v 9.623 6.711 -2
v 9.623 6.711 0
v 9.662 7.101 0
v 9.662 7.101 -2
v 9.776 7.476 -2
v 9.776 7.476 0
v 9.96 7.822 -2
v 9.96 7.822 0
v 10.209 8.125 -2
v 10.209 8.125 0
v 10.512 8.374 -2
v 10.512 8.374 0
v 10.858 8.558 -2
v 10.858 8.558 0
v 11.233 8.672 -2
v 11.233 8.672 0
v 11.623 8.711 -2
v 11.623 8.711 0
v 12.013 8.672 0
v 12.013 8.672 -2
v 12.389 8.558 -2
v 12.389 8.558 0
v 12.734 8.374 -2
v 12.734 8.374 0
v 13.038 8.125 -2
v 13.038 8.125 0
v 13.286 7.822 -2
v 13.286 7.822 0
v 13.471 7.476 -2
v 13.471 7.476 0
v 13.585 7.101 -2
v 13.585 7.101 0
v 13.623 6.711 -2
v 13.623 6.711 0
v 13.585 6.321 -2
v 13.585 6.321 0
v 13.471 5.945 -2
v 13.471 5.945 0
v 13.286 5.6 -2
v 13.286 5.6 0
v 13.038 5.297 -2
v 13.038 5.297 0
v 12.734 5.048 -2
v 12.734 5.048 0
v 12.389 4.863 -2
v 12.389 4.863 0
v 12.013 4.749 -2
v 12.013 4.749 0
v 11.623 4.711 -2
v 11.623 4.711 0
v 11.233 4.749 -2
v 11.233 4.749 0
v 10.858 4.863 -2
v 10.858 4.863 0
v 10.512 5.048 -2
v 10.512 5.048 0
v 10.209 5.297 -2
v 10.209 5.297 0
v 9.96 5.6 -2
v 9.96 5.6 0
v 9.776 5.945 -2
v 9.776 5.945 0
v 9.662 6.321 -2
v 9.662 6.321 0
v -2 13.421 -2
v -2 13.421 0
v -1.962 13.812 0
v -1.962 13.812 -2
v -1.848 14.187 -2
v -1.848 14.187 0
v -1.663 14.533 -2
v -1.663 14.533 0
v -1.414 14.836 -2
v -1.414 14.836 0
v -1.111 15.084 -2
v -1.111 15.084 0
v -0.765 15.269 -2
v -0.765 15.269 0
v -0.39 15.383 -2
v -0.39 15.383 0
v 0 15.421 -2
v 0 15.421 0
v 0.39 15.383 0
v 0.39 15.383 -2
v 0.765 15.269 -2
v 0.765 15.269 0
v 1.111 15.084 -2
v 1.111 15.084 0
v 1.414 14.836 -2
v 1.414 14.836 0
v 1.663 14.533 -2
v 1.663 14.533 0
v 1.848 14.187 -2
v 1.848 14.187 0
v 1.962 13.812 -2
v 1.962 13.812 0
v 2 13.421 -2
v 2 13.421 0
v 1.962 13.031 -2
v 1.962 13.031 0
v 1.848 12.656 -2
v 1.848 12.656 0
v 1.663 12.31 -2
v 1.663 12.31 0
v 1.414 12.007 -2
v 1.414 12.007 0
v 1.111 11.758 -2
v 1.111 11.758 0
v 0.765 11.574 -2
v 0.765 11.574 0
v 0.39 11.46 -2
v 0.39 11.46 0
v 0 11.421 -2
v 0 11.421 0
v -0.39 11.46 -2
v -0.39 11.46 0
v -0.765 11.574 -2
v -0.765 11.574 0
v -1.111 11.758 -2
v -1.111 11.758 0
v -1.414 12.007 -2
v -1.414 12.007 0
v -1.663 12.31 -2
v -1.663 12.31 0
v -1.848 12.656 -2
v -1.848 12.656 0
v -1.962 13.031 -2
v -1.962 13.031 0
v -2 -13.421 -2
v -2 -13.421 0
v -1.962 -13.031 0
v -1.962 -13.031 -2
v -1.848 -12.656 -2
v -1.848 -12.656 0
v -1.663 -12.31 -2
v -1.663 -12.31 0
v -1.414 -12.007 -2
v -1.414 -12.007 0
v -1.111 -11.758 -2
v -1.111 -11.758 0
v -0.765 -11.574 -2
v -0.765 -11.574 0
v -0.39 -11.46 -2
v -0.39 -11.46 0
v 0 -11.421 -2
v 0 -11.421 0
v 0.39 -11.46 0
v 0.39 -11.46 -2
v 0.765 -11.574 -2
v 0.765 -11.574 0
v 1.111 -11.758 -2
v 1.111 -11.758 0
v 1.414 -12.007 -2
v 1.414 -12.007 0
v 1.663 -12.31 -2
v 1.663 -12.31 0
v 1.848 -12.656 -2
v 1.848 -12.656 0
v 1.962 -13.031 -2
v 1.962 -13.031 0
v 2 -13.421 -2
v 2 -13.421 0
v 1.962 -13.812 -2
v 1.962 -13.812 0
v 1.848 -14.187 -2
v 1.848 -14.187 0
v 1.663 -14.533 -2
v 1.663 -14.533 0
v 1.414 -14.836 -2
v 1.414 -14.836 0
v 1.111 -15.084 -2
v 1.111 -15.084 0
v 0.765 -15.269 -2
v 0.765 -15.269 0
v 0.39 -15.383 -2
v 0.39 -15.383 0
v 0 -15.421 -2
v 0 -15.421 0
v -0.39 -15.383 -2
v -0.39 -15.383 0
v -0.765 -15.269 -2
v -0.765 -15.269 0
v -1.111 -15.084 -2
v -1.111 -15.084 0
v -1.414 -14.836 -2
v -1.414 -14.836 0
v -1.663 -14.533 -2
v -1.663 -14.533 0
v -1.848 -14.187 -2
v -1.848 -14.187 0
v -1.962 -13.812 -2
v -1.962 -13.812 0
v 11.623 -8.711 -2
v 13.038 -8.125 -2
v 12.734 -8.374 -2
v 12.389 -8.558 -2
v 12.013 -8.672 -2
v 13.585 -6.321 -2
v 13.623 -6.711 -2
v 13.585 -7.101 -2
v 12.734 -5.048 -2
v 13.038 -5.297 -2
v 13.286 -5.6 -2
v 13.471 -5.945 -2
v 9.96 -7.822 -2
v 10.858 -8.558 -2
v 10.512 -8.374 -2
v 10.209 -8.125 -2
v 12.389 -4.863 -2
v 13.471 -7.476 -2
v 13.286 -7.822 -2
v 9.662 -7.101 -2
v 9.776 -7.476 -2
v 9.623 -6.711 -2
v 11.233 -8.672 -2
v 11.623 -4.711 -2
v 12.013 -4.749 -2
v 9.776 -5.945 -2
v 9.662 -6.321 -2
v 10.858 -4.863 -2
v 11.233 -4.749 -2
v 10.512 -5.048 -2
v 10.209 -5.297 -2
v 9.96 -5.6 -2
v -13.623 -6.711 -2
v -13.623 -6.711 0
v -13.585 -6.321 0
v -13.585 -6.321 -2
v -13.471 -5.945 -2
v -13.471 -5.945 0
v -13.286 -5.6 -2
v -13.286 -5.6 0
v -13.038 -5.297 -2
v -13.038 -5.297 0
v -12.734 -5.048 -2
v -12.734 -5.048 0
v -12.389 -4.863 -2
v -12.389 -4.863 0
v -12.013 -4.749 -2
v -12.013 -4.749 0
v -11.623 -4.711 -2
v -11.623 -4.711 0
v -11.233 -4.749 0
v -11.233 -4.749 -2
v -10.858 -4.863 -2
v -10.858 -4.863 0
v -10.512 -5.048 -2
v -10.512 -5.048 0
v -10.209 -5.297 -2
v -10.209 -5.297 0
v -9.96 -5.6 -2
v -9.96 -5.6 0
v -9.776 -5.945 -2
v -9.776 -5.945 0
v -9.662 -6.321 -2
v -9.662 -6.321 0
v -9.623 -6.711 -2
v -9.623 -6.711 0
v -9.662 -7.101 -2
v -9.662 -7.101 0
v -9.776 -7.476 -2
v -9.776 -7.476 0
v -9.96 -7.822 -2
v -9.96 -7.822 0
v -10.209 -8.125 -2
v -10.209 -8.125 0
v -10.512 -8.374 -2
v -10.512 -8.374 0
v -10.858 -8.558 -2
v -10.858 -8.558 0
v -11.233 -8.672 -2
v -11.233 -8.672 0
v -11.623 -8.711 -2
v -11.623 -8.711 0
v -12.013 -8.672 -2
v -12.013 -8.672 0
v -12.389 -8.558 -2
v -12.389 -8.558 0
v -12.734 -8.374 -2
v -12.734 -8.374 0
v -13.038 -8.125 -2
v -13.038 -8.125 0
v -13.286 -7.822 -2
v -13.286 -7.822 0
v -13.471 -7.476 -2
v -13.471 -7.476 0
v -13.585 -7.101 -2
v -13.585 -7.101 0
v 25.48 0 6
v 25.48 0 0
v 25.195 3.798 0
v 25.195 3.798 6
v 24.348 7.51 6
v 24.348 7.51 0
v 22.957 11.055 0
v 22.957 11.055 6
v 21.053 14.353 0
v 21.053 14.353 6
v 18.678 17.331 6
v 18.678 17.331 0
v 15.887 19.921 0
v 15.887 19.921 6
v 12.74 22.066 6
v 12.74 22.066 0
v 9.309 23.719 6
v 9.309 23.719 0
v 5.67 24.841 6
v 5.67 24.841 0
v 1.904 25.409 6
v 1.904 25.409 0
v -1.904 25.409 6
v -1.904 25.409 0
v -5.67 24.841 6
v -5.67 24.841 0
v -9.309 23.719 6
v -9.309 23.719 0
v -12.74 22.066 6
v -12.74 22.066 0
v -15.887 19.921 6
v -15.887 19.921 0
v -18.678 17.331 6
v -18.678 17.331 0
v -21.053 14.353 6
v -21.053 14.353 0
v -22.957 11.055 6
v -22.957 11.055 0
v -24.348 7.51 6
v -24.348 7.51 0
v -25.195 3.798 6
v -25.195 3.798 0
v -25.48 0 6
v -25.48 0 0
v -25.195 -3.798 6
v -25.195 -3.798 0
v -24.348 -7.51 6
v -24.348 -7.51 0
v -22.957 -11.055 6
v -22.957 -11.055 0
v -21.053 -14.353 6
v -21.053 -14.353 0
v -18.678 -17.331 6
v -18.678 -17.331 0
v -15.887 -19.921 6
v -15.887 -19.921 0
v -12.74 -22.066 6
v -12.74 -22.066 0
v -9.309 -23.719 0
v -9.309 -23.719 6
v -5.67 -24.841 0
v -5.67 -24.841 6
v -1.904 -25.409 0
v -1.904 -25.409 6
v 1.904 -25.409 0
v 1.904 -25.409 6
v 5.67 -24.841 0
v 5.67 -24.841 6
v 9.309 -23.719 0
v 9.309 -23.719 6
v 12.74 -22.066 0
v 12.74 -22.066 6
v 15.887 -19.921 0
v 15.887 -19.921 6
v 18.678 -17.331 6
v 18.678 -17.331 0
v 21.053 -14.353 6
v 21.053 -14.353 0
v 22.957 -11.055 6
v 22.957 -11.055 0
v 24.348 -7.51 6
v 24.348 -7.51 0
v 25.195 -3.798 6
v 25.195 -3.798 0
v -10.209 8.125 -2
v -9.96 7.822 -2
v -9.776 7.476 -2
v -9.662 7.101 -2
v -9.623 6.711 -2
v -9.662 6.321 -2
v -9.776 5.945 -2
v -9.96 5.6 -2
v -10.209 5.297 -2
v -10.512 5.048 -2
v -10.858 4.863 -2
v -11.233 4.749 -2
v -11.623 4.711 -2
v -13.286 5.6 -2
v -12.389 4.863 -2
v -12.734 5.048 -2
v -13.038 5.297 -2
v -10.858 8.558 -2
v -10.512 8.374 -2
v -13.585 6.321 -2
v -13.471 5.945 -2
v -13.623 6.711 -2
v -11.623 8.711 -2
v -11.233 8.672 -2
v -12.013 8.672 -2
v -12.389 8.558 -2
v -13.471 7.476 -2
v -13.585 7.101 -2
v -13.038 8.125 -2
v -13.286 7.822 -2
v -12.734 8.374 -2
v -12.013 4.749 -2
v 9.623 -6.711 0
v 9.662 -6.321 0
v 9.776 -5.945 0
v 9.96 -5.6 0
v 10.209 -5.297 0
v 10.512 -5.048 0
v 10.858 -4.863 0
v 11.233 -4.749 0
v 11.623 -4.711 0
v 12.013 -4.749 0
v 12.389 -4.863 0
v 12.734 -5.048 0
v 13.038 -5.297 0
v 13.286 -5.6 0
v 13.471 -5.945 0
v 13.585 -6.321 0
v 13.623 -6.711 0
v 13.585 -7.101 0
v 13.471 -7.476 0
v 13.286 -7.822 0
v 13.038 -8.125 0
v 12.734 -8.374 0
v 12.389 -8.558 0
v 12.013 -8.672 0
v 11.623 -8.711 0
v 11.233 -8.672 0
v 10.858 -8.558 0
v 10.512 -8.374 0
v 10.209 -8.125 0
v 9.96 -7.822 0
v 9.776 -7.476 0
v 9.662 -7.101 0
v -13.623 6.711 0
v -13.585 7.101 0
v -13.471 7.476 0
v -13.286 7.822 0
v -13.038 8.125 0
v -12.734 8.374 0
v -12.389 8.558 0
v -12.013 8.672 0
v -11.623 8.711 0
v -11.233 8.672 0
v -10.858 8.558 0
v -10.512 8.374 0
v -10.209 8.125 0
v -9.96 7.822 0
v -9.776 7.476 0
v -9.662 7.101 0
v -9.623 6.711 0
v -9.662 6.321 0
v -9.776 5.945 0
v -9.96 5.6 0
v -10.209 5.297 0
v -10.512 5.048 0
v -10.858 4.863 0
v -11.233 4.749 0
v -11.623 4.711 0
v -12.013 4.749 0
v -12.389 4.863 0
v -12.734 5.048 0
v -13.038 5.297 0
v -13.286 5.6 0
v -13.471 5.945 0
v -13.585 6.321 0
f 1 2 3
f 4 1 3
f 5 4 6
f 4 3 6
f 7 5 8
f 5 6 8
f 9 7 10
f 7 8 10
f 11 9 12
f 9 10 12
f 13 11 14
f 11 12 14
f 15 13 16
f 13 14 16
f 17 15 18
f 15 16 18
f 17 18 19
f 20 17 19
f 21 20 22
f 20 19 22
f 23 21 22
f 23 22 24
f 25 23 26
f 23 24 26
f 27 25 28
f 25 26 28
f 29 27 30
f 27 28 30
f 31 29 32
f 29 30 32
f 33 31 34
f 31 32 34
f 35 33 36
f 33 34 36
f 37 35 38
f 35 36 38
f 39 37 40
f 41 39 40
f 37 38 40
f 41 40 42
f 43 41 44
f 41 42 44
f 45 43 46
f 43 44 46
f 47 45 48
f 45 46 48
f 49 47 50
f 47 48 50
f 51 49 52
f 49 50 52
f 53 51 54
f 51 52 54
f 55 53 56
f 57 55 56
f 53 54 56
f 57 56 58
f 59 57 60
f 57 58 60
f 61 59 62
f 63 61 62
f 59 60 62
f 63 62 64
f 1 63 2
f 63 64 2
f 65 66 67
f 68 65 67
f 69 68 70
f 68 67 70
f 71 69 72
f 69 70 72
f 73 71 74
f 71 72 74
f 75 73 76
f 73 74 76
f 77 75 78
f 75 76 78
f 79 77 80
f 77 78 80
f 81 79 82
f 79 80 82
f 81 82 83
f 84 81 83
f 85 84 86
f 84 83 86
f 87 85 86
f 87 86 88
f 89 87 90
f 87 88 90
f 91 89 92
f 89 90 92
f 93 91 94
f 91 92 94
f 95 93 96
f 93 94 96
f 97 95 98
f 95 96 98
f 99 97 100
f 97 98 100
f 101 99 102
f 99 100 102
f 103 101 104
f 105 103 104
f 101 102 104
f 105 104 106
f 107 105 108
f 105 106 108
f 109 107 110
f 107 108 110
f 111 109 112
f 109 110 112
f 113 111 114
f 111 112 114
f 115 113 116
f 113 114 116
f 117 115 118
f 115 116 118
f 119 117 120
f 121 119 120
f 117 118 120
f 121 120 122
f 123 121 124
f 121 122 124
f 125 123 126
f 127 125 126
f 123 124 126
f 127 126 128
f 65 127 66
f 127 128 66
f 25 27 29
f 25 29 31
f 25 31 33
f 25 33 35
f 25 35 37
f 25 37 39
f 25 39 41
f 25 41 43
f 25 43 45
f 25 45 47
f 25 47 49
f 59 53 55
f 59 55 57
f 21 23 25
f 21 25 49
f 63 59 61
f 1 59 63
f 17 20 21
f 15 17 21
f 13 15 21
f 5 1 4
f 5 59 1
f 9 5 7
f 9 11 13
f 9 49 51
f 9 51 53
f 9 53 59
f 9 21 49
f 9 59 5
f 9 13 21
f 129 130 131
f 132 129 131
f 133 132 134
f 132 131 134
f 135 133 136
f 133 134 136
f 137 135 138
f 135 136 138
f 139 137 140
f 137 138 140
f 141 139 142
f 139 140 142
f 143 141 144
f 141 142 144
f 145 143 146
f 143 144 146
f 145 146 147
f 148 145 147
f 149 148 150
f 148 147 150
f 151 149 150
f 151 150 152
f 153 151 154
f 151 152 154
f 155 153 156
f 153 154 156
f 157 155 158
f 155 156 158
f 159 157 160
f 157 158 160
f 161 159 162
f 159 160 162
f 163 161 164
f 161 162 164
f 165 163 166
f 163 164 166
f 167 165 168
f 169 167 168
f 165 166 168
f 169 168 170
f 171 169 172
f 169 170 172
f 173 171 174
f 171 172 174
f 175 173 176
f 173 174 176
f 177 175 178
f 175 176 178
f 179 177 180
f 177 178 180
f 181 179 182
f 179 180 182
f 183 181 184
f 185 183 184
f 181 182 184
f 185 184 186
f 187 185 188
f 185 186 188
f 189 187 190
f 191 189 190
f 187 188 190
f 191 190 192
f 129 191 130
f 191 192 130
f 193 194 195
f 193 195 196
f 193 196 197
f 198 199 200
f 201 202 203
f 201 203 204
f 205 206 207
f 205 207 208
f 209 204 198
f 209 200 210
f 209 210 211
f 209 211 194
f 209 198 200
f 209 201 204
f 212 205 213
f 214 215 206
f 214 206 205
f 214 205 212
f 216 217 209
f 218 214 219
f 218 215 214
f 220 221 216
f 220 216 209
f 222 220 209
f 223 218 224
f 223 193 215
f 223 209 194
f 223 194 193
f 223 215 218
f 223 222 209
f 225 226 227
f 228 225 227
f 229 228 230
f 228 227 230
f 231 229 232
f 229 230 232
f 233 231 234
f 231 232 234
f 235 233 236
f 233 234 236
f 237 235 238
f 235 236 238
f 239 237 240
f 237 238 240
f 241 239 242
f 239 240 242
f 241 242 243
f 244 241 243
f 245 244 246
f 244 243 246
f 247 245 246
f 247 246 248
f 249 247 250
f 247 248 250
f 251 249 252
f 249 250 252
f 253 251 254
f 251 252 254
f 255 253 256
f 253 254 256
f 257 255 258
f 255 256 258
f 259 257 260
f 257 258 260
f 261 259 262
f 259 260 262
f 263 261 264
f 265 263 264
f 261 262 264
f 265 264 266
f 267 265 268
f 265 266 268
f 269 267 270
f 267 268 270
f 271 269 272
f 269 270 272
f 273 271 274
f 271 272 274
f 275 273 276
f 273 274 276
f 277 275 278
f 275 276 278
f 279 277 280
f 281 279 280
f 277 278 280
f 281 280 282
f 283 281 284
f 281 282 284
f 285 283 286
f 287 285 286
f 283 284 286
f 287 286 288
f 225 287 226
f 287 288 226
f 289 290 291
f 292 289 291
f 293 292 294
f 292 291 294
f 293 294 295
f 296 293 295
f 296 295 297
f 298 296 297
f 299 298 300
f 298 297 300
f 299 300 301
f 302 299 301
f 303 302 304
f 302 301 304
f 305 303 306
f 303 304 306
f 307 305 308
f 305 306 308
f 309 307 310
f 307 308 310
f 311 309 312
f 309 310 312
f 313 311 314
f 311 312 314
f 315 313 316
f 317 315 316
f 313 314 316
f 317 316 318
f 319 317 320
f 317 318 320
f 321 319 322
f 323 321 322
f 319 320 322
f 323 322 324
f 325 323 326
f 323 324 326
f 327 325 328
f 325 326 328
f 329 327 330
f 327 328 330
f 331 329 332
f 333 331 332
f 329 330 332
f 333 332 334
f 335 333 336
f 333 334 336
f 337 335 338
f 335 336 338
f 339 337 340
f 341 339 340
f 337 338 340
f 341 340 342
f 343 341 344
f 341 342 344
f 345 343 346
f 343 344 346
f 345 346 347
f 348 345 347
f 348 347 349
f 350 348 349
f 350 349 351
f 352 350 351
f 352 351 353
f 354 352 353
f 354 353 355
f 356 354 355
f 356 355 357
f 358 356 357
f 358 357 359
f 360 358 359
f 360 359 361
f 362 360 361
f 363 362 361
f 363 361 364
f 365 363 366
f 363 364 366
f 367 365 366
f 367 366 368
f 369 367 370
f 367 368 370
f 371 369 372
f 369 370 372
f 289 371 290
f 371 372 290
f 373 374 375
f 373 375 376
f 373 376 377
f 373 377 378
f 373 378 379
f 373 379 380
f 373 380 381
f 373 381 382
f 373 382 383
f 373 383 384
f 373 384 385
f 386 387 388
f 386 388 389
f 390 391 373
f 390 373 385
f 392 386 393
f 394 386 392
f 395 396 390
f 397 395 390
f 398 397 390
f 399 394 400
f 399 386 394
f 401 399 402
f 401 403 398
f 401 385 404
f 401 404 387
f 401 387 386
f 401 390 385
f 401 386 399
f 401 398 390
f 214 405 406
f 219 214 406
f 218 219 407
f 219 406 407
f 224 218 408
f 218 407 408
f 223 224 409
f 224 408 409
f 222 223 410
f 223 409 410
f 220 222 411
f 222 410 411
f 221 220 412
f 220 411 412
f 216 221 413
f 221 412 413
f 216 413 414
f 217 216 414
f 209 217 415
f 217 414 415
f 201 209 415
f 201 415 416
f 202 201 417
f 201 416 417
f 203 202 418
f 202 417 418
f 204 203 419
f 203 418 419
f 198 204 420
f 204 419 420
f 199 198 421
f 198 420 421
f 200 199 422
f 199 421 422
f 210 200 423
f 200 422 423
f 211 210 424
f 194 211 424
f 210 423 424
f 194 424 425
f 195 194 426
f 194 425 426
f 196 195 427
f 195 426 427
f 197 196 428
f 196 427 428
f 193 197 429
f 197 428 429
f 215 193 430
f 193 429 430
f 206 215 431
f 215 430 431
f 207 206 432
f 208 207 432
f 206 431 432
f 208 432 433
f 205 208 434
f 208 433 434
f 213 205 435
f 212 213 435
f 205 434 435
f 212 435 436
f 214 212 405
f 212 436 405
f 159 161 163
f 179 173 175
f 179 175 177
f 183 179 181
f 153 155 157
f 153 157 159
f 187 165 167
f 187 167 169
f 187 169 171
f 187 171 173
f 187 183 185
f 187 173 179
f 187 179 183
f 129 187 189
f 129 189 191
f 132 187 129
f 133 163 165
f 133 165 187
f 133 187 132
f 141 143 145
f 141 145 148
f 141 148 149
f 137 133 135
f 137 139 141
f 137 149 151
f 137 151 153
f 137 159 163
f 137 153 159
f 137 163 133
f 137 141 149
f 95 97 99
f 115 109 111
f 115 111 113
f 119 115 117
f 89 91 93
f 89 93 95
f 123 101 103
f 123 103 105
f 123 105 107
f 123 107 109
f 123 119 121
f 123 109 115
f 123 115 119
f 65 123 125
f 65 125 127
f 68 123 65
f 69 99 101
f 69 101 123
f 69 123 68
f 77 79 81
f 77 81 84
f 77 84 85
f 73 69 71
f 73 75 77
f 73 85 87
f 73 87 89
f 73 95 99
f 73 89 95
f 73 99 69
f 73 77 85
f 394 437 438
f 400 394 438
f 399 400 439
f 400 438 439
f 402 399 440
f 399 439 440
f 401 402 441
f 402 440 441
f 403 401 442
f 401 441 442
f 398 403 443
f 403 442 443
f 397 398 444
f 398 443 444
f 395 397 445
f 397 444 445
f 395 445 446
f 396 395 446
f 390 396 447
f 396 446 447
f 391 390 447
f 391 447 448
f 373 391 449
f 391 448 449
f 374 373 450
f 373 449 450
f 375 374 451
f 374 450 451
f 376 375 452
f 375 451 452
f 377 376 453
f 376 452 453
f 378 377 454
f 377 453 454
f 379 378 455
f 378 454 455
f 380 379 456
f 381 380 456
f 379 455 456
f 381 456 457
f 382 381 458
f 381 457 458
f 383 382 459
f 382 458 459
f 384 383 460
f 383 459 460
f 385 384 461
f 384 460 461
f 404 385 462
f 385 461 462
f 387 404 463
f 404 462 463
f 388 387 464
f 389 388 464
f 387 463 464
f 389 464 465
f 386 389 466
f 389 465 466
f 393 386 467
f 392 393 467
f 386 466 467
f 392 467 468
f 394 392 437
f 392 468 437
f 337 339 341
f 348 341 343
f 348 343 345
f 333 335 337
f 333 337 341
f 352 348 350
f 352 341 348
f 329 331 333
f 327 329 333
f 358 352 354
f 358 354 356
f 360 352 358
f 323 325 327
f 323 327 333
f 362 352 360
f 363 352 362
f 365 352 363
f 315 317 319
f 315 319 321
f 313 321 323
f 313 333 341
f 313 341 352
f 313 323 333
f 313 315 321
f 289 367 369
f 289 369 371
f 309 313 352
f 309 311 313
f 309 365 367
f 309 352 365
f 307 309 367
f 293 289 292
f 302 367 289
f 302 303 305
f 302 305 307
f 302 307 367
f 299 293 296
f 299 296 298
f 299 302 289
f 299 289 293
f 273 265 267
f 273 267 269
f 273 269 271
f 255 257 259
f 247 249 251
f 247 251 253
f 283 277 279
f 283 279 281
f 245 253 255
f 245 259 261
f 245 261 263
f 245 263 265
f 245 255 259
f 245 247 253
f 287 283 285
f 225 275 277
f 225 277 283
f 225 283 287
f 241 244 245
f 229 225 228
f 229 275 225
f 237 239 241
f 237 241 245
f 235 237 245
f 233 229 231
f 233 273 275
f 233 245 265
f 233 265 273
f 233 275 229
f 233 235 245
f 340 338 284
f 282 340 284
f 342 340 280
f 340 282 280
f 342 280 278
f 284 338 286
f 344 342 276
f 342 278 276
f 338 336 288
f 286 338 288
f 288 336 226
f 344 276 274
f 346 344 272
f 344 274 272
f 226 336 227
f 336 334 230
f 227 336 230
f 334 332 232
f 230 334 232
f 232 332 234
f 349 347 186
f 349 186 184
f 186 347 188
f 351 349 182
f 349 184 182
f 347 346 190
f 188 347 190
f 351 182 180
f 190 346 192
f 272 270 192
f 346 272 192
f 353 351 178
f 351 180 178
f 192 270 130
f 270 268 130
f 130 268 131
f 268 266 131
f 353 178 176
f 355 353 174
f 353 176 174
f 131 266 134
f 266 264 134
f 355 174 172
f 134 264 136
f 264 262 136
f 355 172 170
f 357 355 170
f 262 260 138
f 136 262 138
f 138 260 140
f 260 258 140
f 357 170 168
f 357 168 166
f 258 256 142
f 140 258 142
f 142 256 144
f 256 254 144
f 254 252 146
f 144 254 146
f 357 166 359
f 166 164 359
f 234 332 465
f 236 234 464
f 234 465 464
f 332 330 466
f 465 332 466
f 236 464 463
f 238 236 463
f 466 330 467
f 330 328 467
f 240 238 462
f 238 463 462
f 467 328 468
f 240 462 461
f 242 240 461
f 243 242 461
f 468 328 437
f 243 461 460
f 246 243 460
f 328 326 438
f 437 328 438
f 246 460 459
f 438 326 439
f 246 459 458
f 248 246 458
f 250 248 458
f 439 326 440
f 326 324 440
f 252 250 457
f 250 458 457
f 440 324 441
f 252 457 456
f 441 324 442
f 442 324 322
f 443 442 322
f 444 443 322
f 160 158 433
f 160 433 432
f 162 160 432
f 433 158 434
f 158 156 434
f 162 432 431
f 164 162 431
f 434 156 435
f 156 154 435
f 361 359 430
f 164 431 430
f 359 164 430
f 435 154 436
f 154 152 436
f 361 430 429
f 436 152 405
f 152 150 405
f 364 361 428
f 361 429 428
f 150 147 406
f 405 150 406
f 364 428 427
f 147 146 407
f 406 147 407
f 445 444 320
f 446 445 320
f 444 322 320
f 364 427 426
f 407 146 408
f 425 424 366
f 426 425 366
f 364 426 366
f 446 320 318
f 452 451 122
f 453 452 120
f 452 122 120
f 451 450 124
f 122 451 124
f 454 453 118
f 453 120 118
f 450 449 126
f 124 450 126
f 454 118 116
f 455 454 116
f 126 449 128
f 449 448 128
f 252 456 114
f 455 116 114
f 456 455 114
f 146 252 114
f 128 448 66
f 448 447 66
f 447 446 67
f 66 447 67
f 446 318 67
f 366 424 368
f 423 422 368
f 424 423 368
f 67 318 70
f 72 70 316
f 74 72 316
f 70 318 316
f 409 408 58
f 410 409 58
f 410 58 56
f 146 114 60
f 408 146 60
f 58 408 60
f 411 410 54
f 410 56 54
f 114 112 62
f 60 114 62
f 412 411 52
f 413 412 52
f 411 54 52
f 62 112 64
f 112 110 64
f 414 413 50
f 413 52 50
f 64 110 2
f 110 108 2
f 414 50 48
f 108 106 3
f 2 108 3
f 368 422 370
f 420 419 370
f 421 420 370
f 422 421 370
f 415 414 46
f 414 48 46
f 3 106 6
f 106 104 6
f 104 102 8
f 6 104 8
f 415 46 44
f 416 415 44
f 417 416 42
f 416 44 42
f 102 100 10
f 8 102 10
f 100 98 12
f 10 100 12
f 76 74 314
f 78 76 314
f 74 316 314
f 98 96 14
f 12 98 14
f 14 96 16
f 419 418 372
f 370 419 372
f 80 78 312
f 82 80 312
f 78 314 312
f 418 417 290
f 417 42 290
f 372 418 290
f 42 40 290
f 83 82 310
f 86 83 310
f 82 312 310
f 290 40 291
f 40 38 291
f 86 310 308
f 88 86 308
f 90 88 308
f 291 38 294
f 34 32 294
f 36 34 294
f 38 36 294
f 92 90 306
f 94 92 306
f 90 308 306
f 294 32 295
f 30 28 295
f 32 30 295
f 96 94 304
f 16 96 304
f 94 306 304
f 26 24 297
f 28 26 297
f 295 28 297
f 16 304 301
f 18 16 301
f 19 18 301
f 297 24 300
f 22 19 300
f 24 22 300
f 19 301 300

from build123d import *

# Parameters (mm, degrees)
SKETCH1_R           = 25.48
BOSS_EXTRUDE1_DEPTH = 6
SKETCH10_R          = 2
BOSS_EXTRUDE3_DEPTH = 2


with BuildPart() as part:
    # Sketch1 → Boss-Extrude1 (new body)
    with BuildSketch(Plane.XY):
        Circle(SKETCH1_R)
    extrude(amount=BOSS_EXTRUDE1_DEPTH)

    # Sketch10 → Boss-Extrude3 (add)
    with BuildSketch(Plane(origin=(0, 0, 0), x_dir=(-1, 0, 0), z_dir=(0, 0, -1))):
        with Locations((0, 13.421433997)):
            Circle(SKETCH10_R)
        with Locations((11.623302797, 6.710716999)):
            Circle(SKETCH10_R)
        with Locations((11.623302797, -6.710716999)):
            Circle(SKETCH10_R)
        with Locations((0, -13.421433997)):
            Circle(SKETCH10_R)
        with Locations((-11.623302797, -6.710716999)):
            Circle(SKETCH10_R)
        with Locations((-11.623302797, 6.710716999)):
            Circle(SKETCH10_R)
    extrude(amount=BOSS_EXTRUDE3_DEPTH)


solid = part.part
